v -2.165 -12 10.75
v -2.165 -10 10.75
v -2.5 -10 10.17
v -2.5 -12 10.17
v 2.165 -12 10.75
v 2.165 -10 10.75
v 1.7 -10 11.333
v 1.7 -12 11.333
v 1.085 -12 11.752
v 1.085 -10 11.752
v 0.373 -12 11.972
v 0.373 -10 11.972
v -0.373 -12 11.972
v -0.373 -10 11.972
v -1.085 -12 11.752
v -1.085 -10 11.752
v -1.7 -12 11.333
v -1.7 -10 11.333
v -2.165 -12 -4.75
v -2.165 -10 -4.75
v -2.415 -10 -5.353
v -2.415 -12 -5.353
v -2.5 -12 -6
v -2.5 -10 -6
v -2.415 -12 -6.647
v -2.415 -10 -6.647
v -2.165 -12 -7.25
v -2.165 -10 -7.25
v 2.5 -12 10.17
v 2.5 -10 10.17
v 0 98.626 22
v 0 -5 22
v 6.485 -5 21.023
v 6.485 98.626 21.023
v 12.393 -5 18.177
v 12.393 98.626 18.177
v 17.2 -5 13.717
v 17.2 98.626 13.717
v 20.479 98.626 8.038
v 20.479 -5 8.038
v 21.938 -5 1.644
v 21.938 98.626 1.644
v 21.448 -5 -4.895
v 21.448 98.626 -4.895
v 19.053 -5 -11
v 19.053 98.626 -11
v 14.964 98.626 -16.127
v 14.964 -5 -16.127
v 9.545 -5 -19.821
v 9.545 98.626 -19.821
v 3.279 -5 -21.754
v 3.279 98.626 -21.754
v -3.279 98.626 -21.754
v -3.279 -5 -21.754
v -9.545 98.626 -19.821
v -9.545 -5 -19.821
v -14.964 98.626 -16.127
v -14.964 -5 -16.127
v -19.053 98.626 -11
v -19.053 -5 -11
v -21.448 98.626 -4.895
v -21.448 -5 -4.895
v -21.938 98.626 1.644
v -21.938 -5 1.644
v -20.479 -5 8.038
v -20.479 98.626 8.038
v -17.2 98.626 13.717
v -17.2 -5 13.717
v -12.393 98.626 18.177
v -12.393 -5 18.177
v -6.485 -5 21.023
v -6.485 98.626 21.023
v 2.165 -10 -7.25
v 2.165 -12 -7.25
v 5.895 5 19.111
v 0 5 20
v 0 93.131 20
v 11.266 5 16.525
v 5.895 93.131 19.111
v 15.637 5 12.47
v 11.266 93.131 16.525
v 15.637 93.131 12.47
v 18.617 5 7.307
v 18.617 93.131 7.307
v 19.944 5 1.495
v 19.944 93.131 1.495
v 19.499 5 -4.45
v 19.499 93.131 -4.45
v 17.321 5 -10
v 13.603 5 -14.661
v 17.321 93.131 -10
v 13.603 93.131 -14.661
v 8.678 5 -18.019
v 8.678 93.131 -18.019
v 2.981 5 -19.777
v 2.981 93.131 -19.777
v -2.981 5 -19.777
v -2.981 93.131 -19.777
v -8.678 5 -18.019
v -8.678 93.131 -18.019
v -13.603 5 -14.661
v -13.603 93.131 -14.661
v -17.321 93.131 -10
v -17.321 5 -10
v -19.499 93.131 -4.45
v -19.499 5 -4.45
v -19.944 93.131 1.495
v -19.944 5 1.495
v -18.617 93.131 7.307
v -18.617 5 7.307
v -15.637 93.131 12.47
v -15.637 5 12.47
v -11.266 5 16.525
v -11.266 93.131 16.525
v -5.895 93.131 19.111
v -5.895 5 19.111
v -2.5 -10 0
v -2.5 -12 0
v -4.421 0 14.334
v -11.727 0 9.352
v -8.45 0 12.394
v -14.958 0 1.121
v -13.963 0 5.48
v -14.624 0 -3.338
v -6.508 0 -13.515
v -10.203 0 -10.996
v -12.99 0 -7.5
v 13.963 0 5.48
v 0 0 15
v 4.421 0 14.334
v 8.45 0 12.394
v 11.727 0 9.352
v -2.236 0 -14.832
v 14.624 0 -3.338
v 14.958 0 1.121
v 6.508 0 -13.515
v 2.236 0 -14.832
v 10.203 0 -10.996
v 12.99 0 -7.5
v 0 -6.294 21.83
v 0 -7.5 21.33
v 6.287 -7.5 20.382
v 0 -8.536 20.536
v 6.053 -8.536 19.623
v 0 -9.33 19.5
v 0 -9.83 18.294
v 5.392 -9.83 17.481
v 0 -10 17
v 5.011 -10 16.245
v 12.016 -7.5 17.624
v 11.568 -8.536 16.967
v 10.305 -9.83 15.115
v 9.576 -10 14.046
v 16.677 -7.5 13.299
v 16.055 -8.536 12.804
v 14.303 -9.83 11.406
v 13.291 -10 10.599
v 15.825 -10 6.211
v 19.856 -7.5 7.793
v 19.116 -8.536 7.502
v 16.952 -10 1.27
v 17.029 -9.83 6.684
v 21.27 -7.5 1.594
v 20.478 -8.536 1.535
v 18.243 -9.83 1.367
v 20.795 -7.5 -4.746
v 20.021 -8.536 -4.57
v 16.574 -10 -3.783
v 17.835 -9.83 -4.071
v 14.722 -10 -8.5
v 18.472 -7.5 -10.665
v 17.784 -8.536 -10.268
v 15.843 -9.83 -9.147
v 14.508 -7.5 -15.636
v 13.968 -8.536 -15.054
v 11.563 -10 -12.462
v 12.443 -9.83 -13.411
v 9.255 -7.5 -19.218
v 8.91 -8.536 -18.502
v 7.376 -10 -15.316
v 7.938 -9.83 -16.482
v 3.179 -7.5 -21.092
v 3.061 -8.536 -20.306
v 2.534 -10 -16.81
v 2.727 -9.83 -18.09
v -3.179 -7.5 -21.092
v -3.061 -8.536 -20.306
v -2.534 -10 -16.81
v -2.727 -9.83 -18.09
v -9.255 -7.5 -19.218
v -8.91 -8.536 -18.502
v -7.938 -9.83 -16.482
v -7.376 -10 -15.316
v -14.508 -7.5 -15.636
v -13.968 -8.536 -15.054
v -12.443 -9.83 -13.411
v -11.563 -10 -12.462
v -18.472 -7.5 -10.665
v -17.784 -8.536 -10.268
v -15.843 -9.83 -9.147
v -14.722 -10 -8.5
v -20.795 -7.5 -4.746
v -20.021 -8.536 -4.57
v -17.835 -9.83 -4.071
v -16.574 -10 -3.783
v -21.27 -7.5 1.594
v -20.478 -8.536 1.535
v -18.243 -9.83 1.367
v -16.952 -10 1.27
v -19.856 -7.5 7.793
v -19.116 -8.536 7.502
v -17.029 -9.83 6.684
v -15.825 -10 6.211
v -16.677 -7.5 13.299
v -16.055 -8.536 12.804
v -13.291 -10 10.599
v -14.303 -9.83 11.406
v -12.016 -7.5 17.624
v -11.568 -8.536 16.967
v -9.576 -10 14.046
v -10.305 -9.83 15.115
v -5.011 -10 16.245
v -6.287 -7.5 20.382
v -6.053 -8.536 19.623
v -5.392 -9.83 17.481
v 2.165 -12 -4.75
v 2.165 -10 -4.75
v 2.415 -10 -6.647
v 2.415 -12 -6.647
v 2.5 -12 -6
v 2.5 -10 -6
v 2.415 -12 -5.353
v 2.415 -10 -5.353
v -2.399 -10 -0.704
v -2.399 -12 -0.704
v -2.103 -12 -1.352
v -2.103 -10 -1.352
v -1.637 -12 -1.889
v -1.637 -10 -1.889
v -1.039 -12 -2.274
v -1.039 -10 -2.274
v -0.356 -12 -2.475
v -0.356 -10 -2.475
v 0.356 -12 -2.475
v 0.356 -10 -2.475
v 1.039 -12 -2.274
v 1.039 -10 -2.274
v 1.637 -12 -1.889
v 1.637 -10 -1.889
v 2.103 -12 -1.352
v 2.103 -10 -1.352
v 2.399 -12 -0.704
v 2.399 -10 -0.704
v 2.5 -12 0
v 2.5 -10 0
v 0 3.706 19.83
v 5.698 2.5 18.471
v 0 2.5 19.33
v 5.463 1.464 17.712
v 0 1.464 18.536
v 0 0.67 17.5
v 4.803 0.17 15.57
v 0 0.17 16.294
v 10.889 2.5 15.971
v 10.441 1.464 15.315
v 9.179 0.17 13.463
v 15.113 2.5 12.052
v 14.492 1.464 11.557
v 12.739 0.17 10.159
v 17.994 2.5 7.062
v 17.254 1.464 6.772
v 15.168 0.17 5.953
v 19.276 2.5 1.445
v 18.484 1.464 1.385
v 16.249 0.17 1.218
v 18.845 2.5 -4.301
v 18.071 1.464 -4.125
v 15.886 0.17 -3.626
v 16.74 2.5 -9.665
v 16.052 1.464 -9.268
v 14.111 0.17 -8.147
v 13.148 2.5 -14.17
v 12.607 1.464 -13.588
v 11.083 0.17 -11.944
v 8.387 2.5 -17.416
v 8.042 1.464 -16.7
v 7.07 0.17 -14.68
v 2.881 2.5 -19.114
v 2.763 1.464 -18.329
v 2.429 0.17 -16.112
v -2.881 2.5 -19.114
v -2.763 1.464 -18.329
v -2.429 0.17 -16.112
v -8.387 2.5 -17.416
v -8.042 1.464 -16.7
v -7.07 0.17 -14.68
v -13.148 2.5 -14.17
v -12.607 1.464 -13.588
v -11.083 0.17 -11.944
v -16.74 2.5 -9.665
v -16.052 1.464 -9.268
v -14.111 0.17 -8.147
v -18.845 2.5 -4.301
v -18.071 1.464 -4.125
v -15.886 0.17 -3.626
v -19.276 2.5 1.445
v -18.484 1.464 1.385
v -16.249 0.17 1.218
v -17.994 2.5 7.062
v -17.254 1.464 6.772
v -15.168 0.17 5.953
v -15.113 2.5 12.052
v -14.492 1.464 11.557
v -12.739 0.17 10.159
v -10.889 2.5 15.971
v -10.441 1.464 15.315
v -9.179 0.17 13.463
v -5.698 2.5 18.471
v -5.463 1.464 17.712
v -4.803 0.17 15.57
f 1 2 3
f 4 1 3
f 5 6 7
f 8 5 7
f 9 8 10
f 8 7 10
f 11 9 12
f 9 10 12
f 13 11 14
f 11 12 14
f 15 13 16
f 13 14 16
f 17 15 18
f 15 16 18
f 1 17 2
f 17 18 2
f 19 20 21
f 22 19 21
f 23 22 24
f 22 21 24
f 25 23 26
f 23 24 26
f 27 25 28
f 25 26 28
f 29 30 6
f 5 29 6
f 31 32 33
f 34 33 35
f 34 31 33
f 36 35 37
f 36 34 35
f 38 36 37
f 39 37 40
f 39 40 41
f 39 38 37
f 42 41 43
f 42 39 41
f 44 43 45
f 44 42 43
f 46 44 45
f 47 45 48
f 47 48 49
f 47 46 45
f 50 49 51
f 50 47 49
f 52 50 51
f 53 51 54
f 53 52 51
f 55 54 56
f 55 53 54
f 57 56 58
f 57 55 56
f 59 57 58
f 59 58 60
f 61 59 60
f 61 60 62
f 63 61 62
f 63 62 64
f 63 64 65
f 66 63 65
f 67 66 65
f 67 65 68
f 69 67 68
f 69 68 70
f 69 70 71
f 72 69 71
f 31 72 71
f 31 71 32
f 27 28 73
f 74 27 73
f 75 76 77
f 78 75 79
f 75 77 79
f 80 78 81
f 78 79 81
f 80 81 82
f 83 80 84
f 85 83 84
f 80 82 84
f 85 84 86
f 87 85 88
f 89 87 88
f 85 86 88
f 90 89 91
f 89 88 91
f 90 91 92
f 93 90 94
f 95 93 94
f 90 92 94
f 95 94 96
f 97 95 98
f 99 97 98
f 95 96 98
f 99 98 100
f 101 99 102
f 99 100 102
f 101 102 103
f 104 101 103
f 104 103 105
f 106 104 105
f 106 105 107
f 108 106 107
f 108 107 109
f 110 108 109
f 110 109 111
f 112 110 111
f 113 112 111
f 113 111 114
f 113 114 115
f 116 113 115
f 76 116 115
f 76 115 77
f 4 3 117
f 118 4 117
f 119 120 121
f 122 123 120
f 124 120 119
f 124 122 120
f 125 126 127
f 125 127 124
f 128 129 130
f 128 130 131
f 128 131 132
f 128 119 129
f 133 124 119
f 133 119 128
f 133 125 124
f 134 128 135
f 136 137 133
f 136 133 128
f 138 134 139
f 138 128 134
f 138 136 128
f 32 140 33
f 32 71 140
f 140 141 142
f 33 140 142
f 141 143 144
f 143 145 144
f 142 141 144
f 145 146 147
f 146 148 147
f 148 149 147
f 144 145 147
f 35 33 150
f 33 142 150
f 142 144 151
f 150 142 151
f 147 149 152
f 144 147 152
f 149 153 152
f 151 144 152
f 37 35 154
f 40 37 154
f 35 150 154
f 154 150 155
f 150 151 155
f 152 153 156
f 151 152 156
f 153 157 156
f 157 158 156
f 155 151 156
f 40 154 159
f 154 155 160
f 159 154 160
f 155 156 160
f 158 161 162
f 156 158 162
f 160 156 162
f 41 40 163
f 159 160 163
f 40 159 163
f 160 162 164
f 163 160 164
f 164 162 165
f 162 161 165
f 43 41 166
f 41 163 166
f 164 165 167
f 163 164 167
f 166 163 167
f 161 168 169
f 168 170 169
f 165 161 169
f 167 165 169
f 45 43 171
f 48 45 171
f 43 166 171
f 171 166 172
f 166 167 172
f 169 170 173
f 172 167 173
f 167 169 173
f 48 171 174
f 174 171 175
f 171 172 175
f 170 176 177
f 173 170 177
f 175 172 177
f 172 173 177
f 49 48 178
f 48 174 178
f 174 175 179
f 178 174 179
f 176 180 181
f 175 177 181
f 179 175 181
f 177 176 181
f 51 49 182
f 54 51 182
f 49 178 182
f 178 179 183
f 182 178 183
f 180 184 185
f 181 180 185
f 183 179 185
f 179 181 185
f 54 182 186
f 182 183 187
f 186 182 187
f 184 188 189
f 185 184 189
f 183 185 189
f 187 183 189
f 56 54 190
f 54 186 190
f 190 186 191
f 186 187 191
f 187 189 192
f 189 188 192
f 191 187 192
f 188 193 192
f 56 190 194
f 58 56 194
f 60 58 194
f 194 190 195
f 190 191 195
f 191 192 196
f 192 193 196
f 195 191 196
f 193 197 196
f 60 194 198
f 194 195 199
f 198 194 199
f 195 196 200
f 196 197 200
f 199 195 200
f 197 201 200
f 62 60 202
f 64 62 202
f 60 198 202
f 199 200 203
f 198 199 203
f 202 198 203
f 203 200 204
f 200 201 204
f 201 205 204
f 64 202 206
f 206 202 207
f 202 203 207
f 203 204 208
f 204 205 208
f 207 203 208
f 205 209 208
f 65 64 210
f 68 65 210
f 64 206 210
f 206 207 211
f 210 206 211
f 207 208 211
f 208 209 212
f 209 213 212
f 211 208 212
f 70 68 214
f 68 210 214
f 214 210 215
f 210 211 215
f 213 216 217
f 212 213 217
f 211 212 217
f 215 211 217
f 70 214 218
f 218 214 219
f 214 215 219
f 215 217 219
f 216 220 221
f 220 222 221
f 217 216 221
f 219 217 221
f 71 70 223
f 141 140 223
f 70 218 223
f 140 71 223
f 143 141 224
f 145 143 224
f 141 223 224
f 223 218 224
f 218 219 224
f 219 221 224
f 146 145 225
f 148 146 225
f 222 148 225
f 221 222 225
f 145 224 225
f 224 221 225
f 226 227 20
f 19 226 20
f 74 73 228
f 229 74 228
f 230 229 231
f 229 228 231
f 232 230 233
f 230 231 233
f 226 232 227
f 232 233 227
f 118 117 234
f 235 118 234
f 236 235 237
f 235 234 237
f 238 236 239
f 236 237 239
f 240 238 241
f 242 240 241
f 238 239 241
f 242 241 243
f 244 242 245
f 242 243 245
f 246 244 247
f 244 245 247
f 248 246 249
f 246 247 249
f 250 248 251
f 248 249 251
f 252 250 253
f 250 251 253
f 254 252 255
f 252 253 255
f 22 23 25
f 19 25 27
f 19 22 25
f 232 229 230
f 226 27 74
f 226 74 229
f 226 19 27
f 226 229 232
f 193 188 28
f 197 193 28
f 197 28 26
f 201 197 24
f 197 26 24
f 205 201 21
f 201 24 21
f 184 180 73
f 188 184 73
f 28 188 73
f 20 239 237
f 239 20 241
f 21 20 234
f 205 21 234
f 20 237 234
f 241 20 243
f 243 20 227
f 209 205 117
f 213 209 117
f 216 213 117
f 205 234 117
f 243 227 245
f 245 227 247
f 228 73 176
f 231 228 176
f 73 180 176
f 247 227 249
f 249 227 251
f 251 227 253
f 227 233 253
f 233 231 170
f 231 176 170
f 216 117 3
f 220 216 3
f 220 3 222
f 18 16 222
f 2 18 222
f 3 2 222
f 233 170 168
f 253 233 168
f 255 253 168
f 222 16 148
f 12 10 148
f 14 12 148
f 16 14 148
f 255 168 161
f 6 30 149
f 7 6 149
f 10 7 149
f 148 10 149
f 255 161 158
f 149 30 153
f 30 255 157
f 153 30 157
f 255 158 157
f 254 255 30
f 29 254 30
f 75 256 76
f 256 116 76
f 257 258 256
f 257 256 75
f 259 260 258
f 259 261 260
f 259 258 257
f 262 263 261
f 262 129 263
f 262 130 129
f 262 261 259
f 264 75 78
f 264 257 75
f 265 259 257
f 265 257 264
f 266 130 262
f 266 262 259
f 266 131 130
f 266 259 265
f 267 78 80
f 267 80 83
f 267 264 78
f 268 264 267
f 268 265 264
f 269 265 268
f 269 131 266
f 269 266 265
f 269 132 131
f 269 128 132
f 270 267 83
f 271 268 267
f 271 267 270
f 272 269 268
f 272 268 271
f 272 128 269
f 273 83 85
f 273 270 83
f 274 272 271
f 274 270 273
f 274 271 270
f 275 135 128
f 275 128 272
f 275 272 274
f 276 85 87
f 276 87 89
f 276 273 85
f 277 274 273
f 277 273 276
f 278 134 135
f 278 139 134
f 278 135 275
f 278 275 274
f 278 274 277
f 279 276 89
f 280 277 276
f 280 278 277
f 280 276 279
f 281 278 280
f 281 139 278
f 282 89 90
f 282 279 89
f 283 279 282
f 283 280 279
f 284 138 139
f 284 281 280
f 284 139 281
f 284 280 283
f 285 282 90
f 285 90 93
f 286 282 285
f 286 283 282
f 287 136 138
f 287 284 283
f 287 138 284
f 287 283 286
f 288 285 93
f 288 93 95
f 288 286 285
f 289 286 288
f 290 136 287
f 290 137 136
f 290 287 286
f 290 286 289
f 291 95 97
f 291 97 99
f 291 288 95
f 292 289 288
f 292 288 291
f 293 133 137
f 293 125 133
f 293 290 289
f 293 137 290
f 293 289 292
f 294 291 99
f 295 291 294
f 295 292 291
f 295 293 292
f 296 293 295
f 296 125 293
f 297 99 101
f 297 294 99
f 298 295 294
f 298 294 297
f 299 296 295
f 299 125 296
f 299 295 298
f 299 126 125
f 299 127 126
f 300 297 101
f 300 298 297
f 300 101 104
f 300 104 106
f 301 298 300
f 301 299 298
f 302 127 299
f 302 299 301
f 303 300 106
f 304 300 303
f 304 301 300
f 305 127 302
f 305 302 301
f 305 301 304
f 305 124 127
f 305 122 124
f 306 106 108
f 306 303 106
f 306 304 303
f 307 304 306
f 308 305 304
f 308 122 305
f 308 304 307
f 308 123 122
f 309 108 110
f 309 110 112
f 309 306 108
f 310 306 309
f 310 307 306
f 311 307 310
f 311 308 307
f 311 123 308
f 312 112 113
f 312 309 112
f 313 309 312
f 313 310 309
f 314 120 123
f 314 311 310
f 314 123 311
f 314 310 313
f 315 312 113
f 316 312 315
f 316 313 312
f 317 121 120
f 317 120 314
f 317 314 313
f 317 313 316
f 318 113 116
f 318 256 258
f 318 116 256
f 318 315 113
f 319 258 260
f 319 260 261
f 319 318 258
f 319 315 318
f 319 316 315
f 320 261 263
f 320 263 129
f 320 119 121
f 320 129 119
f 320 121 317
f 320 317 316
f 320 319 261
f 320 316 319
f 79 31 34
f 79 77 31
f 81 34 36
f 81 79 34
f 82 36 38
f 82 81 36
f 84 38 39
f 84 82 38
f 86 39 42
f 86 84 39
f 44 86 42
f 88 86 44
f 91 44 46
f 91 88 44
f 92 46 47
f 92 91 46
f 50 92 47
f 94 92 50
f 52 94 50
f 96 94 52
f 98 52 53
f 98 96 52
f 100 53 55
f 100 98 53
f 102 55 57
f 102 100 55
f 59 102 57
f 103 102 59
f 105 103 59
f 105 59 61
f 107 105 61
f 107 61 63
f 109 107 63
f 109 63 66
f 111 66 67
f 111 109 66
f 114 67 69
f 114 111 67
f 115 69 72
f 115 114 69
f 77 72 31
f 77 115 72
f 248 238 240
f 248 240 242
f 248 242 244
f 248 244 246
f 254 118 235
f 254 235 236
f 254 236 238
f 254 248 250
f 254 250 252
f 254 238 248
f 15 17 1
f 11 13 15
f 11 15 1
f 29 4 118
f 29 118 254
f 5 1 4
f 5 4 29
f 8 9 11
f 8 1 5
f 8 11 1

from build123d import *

# Parameters (mm, degrees)
SKETCH1_R           = 22
SKETCH1_R_2         = 20
BOSS_EXTRUDE1_DEPTH = 10
BOSS_EXTRUDE2_START = 100
SKETCH1_3_R         = 22
SKETCH1_3_R_2       = 20
BOSS_EXTRUDE2_DEPTH = 100
FILLET1_R           = 5
FILLET2_R           = 5
BOSS_EXTRUDE3_DEPTH = 2
CHAMFER1_SIZE       = 2.5
CHAMFER1_SIZE_2     = 6.868693549


with BuildPart() as part:
    # Sketch1 → Boss-Extrude1 (new body)
    # profile 1 of 2: a face of its own
    with BuildSketch(Plane(origin=(0, 0, 0), x_dir=(1, 0, 0), z_dir=(0, 1, 0))):
        with Locations(Location((0, 0, 0), (0, 0, 270))):
            Circle(SKETCH1_R)
        Circle(SKETCH1_R_2, mode=Mode.SUBTRACT)
    # profile 2 of 2: a face of its own
    with BuildSketch(Plane(origin=(0, 0, 0), x_dir=(1, 0, 0), z_dir=(0, 1, 0))):
        Circle(SKETCH1_R_2)
    extrude(amount=-BOSS_EXTRUDE1_DEPTH)

    # Sketch1<3> → Boss-Extrude2 (add)
    with BuildSketch(Plane(origin=(0, 0, 0), x_dir=(1, 0, 0), z_dir=(0, 1, 0)).offset(BOSS_EXTRUDE2_START)):
        with Locations(Location((0, 0, 0), (0, 0, 270))):
            Circle(SKETCH1_3_R)
        with Locations(Location((0, 0, 0), (0, 0, 270))):
            Circle(SKETCH1_3_R_2, mode=Mode.SUBTRACT)
    extrude(amount=-BOSS_EXTRUDE2_DEPTH)

    # Fillet1
    fillet1_edges = [part.edges().sort_by_distance(p)[0] for p in [
        (0, 0, -20),
    ]]
    fillet(fillet1_edges, radius=FILLET1_R)

    # Fillet2
    fillet2_edges = [part.edges().sort_by_distance(p)[0] for p in [
        (0, -10, -22),
    ]]
    fillet(fillet2_edges, radius=FILLET2_R)

    # Sketch2 → Boss-Extrude3 (add)
    with BuildSketch(Plane.XZ.offset(10)):
        with BuildLine():
            ThreePointArc((2.165063509, 10.75), (0, 12), (-2.165063509, 10.75))
            Line((-2.165063509, 10.75), (-2.5, 10.169872981))
            Line((-2.5, 10.169872981), (-2.5, 0))
            ThreePointArc((-2.5, 0), (0, -2.5), (2.5, 0))
            Line((2.5, 0), (2.5, 10.169872981))
            Line((2.5, 10.169872981), (2.165063509, 10.75))
        make_face()
        with BuildLine():
            ThreePointArc((-2.165063509, -4.75), (-2.5, -6), (-2.165063509, -7.25))
            Line((-2.165063509, -7.25), (2.165063509, -7.25))
            ThreePointArc((2.165063509, -7.25), (2.5, -6), (2.165063509, -4.75))
            Line((2.165063509, -4.75), (-2.165063509, -4.75))
        make_face()
    extrude(amount=BOSS_EXTRUDE3_DEPTH)

    # Chamfer1
    # the kernel refuses this chamfer: 6.868693549, 2.5 mm, written as the material it takes off along each edge
    with BuildSketch(Plane(origin=(0, 100, 0), x_dir=(0, 0, 1), z_dir=(-1, 0, 0))) as chamfer1_piece_1:
        Polygon((20 + CHAMFER1_SIZE, 0), (20, -CHAMFER1_SIZE_2), (20, 0), align=None)
    revolve(axis=Axis((0, 100, 0), (0, 1, 0)), mode=Mode.SUBTRACT)


solid = part.part
